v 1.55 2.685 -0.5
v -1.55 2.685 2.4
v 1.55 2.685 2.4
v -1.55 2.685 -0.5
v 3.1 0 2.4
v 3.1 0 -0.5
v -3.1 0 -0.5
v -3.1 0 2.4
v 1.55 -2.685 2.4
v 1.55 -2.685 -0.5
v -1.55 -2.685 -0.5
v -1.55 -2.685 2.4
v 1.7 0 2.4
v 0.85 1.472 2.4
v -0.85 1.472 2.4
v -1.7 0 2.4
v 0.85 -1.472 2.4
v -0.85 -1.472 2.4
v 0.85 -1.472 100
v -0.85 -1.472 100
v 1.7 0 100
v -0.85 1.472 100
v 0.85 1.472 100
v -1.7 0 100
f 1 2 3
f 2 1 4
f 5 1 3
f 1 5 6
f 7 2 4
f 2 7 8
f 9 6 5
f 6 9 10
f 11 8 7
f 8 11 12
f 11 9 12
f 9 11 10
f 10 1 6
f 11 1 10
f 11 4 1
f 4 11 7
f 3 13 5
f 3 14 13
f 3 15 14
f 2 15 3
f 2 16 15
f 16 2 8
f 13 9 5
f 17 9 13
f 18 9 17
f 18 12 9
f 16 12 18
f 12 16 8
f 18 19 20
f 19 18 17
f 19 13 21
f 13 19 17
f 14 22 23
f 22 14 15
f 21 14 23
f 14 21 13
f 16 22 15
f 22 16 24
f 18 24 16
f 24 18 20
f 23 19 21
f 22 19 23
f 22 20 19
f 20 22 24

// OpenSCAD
module nutTrap(screw="m3", trapDepth=0, depth=100) {
		hexEdge=3.1;
		trapDepth = trapDepth==0 ? 2.4 : trapDepth;
		holeDiam=3.4;

	union() {
		translate([0,0,-.5])
			linear_extrude(height=trapDepth+.5)
			polygon(points=[
				[-hexEdge,0],
				[-hexEdge*sin(30), -hexEdge*cos(30)],
				[hexEdge*sin(30), -hexEdge*cos(30)],
				[hexEdge,0],
				[hexEdge*sin(30), hexEdge*cos(30)],
				[-hexEdge*sin(30), hexEdge*cos(30)]]);
		cylinder(d=holeDiam, h=depth);
	}
}

nutTrap();
